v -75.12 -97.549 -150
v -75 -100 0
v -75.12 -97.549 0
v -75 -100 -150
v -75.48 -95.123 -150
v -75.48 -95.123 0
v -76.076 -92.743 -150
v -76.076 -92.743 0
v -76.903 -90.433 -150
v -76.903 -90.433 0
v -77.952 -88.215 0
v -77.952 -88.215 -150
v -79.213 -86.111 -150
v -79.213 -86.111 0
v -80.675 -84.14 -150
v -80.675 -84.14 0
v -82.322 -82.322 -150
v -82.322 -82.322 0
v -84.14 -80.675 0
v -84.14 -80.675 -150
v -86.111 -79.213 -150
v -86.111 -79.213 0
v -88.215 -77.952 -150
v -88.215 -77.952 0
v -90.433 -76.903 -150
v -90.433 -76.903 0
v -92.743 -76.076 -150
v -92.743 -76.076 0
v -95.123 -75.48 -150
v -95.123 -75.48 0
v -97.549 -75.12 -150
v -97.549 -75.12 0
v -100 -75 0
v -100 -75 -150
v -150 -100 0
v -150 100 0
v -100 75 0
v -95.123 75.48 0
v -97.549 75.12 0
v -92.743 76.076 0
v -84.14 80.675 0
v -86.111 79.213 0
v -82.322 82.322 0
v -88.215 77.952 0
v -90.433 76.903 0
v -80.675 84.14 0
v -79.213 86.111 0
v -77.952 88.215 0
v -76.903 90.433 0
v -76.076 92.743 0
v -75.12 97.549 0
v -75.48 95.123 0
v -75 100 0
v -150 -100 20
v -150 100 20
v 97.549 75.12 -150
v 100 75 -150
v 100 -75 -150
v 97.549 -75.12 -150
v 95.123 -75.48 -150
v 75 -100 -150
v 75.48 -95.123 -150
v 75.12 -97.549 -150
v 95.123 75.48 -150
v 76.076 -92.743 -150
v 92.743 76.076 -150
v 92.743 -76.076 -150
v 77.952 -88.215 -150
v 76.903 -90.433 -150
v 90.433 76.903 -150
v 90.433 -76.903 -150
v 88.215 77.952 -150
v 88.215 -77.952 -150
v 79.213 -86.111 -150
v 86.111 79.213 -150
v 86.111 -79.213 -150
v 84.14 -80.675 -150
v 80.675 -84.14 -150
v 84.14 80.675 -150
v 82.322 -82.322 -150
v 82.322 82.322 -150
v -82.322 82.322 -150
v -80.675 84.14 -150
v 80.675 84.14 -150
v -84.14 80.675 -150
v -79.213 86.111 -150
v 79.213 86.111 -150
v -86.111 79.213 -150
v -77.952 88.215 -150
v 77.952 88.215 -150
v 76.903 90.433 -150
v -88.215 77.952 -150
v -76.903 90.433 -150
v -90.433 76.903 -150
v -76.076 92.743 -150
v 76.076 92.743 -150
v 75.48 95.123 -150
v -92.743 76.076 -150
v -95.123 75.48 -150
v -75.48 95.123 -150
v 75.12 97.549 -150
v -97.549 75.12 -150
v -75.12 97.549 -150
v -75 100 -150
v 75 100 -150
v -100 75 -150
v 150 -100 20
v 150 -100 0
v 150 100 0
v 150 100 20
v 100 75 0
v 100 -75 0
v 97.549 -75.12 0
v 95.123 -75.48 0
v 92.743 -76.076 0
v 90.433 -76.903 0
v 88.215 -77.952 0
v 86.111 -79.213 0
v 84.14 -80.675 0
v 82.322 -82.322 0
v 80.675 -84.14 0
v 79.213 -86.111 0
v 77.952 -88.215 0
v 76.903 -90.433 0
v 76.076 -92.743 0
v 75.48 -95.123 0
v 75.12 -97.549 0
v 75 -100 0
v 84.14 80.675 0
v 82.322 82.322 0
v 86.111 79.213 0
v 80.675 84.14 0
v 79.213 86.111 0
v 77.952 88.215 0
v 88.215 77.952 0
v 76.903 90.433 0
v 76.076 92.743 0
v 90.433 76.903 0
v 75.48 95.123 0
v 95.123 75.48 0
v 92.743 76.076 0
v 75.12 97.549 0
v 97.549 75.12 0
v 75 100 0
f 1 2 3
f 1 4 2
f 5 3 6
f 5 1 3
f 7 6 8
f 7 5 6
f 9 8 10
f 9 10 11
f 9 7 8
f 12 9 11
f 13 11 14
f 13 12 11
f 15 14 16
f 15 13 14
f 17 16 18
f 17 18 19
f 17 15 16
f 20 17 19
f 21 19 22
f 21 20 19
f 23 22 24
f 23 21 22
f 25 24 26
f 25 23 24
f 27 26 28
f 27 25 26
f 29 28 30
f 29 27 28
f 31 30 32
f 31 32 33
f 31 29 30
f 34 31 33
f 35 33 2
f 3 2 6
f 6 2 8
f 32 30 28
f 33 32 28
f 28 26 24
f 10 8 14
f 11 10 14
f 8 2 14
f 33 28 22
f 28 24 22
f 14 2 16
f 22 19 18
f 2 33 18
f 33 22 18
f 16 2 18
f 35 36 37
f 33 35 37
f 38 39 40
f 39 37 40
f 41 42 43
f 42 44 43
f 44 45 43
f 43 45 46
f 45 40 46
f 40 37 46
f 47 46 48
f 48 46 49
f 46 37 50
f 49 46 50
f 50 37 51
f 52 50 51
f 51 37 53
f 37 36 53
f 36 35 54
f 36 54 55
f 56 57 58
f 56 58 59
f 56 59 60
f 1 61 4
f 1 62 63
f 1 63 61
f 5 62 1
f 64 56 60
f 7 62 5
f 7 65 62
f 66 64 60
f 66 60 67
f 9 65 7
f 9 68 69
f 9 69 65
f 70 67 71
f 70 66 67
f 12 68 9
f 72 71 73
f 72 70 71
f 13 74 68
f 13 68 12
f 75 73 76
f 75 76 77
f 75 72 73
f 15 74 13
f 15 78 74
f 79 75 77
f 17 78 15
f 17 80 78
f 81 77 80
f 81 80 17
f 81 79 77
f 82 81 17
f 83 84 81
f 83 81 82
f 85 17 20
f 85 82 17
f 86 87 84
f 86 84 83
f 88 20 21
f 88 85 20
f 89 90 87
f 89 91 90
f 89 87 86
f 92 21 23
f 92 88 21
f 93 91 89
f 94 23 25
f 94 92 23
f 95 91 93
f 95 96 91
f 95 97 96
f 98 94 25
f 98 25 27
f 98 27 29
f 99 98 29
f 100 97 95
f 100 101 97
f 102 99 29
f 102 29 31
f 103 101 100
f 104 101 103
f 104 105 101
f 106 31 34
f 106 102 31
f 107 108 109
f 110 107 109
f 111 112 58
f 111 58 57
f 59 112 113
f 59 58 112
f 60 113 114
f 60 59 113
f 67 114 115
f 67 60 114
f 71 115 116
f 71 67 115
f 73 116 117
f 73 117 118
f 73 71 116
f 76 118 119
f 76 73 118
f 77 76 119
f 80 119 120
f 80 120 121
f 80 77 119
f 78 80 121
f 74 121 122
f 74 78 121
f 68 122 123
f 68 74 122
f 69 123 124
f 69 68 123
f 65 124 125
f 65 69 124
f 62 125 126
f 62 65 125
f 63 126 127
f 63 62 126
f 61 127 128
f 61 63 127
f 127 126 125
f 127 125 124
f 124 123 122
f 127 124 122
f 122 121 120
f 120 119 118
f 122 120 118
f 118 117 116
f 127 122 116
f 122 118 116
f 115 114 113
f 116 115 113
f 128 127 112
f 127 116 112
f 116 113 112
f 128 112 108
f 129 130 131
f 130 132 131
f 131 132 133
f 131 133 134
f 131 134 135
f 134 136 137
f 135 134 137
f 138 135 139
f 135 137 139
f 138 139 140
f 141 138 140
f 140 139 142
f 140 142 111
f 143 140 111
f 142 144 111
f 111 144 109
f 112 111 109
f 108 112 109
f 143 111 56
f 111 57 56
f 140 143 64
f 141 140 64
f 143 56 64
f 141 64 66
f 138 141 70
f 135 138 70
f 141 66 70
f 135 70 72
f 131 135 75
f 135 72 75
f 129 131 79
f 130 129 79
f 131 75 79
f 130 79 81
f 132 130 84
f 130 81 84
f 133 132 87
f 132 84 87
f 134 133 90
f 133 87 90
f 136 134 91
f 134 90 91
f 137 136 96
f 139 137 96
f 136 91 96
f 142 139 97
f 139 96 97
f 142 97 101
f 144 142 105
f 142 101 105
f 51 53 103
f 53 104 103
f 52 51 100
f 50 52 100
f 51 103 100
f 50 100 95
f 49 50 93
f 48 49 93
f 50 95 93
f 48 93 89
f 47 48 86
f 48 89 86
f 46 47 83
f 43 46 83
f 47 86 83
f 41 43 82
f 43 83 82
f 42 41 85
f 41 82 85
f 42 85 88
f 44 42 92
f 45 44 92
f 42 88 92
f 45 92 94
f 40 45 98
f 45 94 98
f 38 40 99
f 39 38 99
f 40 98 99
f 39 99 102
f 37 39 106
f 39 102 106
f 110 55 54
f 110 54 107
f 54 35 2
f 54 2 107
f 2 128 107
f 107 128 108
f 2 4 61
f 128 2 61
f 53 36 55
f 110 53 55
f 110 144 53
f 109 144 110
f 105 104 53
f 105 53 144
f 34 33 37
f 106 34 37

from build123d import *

# Parameters (mm, degrees)
SKETCH1_W           = 300
SKETCH1_H           = 200
BOSS_EXTRUDE1_DEPTH = 20
SKETCH2_W           = 150
SKETCH2_H           = 25
SKETCH2_H_2         = 150
SKETCH2_W_2         = 25
BOSS_EXTRUDE2_DEPTH = 150
FILLET1_R           = 25
FILLET2_R           = 25


with BuildPart() as part:
    # Sketch1 → Boss-Extrude1 (new body)
    with BuildSketch(Plane.XY):
        Rectangle(SKETCH1_W, SKETCH1_H)
    extrude(amount=BOSS_EXTRUDE1_DEPTH)

    # Sketch2 → Boss-Extrude2 (add)
    with BuildSketch(Plane(origin=(0, 0, 0), x_dir=(-1, 0, 0), z_dir=(0, 0, -1))):
        with Locations((0, 87.5)):
            Rectangle(SKETCH2_W, SKETCH2_H)
        Rectangle(SKETCH2_W, SKETCH2_H_2)
        with Locations((-87.5, 0)):
            Rectangle(SKETCH2_W_2, SKETCH2_H_2)
        with Locations((87.5, 0)):
            Rectangle(SKETCH2_W_2, SKETCH2_H_2)
        with Locations((0, -87.5)):
            Rectangle(SKETCH2_W, SKETCH2_H)
    extrude(amount=BOSS_EXTRUDE2_DEPTH)

    # Fillet1
    fillet1_edges = [part.edges().sort_by_distance(p)[0] for p in [
        (75, 75, -75),
    ]]
    fillet(fillet1_edges, radius=FILLET1_R - 0.0001)  # a hair under: the kernel refuses the full size

    # Fillet2
    fillet2_edges = [part.edges().sort_by_distance(p)[0] for p in [
        (75, -75, -75),
        (-75, -75, -75),
        (-75, 75, -75),
    ]]
    fillet(fillet2_edges, radius=FILLET2_R - 0.0001)  # a hair under: the kernel refuses the full size


solid = part.part
